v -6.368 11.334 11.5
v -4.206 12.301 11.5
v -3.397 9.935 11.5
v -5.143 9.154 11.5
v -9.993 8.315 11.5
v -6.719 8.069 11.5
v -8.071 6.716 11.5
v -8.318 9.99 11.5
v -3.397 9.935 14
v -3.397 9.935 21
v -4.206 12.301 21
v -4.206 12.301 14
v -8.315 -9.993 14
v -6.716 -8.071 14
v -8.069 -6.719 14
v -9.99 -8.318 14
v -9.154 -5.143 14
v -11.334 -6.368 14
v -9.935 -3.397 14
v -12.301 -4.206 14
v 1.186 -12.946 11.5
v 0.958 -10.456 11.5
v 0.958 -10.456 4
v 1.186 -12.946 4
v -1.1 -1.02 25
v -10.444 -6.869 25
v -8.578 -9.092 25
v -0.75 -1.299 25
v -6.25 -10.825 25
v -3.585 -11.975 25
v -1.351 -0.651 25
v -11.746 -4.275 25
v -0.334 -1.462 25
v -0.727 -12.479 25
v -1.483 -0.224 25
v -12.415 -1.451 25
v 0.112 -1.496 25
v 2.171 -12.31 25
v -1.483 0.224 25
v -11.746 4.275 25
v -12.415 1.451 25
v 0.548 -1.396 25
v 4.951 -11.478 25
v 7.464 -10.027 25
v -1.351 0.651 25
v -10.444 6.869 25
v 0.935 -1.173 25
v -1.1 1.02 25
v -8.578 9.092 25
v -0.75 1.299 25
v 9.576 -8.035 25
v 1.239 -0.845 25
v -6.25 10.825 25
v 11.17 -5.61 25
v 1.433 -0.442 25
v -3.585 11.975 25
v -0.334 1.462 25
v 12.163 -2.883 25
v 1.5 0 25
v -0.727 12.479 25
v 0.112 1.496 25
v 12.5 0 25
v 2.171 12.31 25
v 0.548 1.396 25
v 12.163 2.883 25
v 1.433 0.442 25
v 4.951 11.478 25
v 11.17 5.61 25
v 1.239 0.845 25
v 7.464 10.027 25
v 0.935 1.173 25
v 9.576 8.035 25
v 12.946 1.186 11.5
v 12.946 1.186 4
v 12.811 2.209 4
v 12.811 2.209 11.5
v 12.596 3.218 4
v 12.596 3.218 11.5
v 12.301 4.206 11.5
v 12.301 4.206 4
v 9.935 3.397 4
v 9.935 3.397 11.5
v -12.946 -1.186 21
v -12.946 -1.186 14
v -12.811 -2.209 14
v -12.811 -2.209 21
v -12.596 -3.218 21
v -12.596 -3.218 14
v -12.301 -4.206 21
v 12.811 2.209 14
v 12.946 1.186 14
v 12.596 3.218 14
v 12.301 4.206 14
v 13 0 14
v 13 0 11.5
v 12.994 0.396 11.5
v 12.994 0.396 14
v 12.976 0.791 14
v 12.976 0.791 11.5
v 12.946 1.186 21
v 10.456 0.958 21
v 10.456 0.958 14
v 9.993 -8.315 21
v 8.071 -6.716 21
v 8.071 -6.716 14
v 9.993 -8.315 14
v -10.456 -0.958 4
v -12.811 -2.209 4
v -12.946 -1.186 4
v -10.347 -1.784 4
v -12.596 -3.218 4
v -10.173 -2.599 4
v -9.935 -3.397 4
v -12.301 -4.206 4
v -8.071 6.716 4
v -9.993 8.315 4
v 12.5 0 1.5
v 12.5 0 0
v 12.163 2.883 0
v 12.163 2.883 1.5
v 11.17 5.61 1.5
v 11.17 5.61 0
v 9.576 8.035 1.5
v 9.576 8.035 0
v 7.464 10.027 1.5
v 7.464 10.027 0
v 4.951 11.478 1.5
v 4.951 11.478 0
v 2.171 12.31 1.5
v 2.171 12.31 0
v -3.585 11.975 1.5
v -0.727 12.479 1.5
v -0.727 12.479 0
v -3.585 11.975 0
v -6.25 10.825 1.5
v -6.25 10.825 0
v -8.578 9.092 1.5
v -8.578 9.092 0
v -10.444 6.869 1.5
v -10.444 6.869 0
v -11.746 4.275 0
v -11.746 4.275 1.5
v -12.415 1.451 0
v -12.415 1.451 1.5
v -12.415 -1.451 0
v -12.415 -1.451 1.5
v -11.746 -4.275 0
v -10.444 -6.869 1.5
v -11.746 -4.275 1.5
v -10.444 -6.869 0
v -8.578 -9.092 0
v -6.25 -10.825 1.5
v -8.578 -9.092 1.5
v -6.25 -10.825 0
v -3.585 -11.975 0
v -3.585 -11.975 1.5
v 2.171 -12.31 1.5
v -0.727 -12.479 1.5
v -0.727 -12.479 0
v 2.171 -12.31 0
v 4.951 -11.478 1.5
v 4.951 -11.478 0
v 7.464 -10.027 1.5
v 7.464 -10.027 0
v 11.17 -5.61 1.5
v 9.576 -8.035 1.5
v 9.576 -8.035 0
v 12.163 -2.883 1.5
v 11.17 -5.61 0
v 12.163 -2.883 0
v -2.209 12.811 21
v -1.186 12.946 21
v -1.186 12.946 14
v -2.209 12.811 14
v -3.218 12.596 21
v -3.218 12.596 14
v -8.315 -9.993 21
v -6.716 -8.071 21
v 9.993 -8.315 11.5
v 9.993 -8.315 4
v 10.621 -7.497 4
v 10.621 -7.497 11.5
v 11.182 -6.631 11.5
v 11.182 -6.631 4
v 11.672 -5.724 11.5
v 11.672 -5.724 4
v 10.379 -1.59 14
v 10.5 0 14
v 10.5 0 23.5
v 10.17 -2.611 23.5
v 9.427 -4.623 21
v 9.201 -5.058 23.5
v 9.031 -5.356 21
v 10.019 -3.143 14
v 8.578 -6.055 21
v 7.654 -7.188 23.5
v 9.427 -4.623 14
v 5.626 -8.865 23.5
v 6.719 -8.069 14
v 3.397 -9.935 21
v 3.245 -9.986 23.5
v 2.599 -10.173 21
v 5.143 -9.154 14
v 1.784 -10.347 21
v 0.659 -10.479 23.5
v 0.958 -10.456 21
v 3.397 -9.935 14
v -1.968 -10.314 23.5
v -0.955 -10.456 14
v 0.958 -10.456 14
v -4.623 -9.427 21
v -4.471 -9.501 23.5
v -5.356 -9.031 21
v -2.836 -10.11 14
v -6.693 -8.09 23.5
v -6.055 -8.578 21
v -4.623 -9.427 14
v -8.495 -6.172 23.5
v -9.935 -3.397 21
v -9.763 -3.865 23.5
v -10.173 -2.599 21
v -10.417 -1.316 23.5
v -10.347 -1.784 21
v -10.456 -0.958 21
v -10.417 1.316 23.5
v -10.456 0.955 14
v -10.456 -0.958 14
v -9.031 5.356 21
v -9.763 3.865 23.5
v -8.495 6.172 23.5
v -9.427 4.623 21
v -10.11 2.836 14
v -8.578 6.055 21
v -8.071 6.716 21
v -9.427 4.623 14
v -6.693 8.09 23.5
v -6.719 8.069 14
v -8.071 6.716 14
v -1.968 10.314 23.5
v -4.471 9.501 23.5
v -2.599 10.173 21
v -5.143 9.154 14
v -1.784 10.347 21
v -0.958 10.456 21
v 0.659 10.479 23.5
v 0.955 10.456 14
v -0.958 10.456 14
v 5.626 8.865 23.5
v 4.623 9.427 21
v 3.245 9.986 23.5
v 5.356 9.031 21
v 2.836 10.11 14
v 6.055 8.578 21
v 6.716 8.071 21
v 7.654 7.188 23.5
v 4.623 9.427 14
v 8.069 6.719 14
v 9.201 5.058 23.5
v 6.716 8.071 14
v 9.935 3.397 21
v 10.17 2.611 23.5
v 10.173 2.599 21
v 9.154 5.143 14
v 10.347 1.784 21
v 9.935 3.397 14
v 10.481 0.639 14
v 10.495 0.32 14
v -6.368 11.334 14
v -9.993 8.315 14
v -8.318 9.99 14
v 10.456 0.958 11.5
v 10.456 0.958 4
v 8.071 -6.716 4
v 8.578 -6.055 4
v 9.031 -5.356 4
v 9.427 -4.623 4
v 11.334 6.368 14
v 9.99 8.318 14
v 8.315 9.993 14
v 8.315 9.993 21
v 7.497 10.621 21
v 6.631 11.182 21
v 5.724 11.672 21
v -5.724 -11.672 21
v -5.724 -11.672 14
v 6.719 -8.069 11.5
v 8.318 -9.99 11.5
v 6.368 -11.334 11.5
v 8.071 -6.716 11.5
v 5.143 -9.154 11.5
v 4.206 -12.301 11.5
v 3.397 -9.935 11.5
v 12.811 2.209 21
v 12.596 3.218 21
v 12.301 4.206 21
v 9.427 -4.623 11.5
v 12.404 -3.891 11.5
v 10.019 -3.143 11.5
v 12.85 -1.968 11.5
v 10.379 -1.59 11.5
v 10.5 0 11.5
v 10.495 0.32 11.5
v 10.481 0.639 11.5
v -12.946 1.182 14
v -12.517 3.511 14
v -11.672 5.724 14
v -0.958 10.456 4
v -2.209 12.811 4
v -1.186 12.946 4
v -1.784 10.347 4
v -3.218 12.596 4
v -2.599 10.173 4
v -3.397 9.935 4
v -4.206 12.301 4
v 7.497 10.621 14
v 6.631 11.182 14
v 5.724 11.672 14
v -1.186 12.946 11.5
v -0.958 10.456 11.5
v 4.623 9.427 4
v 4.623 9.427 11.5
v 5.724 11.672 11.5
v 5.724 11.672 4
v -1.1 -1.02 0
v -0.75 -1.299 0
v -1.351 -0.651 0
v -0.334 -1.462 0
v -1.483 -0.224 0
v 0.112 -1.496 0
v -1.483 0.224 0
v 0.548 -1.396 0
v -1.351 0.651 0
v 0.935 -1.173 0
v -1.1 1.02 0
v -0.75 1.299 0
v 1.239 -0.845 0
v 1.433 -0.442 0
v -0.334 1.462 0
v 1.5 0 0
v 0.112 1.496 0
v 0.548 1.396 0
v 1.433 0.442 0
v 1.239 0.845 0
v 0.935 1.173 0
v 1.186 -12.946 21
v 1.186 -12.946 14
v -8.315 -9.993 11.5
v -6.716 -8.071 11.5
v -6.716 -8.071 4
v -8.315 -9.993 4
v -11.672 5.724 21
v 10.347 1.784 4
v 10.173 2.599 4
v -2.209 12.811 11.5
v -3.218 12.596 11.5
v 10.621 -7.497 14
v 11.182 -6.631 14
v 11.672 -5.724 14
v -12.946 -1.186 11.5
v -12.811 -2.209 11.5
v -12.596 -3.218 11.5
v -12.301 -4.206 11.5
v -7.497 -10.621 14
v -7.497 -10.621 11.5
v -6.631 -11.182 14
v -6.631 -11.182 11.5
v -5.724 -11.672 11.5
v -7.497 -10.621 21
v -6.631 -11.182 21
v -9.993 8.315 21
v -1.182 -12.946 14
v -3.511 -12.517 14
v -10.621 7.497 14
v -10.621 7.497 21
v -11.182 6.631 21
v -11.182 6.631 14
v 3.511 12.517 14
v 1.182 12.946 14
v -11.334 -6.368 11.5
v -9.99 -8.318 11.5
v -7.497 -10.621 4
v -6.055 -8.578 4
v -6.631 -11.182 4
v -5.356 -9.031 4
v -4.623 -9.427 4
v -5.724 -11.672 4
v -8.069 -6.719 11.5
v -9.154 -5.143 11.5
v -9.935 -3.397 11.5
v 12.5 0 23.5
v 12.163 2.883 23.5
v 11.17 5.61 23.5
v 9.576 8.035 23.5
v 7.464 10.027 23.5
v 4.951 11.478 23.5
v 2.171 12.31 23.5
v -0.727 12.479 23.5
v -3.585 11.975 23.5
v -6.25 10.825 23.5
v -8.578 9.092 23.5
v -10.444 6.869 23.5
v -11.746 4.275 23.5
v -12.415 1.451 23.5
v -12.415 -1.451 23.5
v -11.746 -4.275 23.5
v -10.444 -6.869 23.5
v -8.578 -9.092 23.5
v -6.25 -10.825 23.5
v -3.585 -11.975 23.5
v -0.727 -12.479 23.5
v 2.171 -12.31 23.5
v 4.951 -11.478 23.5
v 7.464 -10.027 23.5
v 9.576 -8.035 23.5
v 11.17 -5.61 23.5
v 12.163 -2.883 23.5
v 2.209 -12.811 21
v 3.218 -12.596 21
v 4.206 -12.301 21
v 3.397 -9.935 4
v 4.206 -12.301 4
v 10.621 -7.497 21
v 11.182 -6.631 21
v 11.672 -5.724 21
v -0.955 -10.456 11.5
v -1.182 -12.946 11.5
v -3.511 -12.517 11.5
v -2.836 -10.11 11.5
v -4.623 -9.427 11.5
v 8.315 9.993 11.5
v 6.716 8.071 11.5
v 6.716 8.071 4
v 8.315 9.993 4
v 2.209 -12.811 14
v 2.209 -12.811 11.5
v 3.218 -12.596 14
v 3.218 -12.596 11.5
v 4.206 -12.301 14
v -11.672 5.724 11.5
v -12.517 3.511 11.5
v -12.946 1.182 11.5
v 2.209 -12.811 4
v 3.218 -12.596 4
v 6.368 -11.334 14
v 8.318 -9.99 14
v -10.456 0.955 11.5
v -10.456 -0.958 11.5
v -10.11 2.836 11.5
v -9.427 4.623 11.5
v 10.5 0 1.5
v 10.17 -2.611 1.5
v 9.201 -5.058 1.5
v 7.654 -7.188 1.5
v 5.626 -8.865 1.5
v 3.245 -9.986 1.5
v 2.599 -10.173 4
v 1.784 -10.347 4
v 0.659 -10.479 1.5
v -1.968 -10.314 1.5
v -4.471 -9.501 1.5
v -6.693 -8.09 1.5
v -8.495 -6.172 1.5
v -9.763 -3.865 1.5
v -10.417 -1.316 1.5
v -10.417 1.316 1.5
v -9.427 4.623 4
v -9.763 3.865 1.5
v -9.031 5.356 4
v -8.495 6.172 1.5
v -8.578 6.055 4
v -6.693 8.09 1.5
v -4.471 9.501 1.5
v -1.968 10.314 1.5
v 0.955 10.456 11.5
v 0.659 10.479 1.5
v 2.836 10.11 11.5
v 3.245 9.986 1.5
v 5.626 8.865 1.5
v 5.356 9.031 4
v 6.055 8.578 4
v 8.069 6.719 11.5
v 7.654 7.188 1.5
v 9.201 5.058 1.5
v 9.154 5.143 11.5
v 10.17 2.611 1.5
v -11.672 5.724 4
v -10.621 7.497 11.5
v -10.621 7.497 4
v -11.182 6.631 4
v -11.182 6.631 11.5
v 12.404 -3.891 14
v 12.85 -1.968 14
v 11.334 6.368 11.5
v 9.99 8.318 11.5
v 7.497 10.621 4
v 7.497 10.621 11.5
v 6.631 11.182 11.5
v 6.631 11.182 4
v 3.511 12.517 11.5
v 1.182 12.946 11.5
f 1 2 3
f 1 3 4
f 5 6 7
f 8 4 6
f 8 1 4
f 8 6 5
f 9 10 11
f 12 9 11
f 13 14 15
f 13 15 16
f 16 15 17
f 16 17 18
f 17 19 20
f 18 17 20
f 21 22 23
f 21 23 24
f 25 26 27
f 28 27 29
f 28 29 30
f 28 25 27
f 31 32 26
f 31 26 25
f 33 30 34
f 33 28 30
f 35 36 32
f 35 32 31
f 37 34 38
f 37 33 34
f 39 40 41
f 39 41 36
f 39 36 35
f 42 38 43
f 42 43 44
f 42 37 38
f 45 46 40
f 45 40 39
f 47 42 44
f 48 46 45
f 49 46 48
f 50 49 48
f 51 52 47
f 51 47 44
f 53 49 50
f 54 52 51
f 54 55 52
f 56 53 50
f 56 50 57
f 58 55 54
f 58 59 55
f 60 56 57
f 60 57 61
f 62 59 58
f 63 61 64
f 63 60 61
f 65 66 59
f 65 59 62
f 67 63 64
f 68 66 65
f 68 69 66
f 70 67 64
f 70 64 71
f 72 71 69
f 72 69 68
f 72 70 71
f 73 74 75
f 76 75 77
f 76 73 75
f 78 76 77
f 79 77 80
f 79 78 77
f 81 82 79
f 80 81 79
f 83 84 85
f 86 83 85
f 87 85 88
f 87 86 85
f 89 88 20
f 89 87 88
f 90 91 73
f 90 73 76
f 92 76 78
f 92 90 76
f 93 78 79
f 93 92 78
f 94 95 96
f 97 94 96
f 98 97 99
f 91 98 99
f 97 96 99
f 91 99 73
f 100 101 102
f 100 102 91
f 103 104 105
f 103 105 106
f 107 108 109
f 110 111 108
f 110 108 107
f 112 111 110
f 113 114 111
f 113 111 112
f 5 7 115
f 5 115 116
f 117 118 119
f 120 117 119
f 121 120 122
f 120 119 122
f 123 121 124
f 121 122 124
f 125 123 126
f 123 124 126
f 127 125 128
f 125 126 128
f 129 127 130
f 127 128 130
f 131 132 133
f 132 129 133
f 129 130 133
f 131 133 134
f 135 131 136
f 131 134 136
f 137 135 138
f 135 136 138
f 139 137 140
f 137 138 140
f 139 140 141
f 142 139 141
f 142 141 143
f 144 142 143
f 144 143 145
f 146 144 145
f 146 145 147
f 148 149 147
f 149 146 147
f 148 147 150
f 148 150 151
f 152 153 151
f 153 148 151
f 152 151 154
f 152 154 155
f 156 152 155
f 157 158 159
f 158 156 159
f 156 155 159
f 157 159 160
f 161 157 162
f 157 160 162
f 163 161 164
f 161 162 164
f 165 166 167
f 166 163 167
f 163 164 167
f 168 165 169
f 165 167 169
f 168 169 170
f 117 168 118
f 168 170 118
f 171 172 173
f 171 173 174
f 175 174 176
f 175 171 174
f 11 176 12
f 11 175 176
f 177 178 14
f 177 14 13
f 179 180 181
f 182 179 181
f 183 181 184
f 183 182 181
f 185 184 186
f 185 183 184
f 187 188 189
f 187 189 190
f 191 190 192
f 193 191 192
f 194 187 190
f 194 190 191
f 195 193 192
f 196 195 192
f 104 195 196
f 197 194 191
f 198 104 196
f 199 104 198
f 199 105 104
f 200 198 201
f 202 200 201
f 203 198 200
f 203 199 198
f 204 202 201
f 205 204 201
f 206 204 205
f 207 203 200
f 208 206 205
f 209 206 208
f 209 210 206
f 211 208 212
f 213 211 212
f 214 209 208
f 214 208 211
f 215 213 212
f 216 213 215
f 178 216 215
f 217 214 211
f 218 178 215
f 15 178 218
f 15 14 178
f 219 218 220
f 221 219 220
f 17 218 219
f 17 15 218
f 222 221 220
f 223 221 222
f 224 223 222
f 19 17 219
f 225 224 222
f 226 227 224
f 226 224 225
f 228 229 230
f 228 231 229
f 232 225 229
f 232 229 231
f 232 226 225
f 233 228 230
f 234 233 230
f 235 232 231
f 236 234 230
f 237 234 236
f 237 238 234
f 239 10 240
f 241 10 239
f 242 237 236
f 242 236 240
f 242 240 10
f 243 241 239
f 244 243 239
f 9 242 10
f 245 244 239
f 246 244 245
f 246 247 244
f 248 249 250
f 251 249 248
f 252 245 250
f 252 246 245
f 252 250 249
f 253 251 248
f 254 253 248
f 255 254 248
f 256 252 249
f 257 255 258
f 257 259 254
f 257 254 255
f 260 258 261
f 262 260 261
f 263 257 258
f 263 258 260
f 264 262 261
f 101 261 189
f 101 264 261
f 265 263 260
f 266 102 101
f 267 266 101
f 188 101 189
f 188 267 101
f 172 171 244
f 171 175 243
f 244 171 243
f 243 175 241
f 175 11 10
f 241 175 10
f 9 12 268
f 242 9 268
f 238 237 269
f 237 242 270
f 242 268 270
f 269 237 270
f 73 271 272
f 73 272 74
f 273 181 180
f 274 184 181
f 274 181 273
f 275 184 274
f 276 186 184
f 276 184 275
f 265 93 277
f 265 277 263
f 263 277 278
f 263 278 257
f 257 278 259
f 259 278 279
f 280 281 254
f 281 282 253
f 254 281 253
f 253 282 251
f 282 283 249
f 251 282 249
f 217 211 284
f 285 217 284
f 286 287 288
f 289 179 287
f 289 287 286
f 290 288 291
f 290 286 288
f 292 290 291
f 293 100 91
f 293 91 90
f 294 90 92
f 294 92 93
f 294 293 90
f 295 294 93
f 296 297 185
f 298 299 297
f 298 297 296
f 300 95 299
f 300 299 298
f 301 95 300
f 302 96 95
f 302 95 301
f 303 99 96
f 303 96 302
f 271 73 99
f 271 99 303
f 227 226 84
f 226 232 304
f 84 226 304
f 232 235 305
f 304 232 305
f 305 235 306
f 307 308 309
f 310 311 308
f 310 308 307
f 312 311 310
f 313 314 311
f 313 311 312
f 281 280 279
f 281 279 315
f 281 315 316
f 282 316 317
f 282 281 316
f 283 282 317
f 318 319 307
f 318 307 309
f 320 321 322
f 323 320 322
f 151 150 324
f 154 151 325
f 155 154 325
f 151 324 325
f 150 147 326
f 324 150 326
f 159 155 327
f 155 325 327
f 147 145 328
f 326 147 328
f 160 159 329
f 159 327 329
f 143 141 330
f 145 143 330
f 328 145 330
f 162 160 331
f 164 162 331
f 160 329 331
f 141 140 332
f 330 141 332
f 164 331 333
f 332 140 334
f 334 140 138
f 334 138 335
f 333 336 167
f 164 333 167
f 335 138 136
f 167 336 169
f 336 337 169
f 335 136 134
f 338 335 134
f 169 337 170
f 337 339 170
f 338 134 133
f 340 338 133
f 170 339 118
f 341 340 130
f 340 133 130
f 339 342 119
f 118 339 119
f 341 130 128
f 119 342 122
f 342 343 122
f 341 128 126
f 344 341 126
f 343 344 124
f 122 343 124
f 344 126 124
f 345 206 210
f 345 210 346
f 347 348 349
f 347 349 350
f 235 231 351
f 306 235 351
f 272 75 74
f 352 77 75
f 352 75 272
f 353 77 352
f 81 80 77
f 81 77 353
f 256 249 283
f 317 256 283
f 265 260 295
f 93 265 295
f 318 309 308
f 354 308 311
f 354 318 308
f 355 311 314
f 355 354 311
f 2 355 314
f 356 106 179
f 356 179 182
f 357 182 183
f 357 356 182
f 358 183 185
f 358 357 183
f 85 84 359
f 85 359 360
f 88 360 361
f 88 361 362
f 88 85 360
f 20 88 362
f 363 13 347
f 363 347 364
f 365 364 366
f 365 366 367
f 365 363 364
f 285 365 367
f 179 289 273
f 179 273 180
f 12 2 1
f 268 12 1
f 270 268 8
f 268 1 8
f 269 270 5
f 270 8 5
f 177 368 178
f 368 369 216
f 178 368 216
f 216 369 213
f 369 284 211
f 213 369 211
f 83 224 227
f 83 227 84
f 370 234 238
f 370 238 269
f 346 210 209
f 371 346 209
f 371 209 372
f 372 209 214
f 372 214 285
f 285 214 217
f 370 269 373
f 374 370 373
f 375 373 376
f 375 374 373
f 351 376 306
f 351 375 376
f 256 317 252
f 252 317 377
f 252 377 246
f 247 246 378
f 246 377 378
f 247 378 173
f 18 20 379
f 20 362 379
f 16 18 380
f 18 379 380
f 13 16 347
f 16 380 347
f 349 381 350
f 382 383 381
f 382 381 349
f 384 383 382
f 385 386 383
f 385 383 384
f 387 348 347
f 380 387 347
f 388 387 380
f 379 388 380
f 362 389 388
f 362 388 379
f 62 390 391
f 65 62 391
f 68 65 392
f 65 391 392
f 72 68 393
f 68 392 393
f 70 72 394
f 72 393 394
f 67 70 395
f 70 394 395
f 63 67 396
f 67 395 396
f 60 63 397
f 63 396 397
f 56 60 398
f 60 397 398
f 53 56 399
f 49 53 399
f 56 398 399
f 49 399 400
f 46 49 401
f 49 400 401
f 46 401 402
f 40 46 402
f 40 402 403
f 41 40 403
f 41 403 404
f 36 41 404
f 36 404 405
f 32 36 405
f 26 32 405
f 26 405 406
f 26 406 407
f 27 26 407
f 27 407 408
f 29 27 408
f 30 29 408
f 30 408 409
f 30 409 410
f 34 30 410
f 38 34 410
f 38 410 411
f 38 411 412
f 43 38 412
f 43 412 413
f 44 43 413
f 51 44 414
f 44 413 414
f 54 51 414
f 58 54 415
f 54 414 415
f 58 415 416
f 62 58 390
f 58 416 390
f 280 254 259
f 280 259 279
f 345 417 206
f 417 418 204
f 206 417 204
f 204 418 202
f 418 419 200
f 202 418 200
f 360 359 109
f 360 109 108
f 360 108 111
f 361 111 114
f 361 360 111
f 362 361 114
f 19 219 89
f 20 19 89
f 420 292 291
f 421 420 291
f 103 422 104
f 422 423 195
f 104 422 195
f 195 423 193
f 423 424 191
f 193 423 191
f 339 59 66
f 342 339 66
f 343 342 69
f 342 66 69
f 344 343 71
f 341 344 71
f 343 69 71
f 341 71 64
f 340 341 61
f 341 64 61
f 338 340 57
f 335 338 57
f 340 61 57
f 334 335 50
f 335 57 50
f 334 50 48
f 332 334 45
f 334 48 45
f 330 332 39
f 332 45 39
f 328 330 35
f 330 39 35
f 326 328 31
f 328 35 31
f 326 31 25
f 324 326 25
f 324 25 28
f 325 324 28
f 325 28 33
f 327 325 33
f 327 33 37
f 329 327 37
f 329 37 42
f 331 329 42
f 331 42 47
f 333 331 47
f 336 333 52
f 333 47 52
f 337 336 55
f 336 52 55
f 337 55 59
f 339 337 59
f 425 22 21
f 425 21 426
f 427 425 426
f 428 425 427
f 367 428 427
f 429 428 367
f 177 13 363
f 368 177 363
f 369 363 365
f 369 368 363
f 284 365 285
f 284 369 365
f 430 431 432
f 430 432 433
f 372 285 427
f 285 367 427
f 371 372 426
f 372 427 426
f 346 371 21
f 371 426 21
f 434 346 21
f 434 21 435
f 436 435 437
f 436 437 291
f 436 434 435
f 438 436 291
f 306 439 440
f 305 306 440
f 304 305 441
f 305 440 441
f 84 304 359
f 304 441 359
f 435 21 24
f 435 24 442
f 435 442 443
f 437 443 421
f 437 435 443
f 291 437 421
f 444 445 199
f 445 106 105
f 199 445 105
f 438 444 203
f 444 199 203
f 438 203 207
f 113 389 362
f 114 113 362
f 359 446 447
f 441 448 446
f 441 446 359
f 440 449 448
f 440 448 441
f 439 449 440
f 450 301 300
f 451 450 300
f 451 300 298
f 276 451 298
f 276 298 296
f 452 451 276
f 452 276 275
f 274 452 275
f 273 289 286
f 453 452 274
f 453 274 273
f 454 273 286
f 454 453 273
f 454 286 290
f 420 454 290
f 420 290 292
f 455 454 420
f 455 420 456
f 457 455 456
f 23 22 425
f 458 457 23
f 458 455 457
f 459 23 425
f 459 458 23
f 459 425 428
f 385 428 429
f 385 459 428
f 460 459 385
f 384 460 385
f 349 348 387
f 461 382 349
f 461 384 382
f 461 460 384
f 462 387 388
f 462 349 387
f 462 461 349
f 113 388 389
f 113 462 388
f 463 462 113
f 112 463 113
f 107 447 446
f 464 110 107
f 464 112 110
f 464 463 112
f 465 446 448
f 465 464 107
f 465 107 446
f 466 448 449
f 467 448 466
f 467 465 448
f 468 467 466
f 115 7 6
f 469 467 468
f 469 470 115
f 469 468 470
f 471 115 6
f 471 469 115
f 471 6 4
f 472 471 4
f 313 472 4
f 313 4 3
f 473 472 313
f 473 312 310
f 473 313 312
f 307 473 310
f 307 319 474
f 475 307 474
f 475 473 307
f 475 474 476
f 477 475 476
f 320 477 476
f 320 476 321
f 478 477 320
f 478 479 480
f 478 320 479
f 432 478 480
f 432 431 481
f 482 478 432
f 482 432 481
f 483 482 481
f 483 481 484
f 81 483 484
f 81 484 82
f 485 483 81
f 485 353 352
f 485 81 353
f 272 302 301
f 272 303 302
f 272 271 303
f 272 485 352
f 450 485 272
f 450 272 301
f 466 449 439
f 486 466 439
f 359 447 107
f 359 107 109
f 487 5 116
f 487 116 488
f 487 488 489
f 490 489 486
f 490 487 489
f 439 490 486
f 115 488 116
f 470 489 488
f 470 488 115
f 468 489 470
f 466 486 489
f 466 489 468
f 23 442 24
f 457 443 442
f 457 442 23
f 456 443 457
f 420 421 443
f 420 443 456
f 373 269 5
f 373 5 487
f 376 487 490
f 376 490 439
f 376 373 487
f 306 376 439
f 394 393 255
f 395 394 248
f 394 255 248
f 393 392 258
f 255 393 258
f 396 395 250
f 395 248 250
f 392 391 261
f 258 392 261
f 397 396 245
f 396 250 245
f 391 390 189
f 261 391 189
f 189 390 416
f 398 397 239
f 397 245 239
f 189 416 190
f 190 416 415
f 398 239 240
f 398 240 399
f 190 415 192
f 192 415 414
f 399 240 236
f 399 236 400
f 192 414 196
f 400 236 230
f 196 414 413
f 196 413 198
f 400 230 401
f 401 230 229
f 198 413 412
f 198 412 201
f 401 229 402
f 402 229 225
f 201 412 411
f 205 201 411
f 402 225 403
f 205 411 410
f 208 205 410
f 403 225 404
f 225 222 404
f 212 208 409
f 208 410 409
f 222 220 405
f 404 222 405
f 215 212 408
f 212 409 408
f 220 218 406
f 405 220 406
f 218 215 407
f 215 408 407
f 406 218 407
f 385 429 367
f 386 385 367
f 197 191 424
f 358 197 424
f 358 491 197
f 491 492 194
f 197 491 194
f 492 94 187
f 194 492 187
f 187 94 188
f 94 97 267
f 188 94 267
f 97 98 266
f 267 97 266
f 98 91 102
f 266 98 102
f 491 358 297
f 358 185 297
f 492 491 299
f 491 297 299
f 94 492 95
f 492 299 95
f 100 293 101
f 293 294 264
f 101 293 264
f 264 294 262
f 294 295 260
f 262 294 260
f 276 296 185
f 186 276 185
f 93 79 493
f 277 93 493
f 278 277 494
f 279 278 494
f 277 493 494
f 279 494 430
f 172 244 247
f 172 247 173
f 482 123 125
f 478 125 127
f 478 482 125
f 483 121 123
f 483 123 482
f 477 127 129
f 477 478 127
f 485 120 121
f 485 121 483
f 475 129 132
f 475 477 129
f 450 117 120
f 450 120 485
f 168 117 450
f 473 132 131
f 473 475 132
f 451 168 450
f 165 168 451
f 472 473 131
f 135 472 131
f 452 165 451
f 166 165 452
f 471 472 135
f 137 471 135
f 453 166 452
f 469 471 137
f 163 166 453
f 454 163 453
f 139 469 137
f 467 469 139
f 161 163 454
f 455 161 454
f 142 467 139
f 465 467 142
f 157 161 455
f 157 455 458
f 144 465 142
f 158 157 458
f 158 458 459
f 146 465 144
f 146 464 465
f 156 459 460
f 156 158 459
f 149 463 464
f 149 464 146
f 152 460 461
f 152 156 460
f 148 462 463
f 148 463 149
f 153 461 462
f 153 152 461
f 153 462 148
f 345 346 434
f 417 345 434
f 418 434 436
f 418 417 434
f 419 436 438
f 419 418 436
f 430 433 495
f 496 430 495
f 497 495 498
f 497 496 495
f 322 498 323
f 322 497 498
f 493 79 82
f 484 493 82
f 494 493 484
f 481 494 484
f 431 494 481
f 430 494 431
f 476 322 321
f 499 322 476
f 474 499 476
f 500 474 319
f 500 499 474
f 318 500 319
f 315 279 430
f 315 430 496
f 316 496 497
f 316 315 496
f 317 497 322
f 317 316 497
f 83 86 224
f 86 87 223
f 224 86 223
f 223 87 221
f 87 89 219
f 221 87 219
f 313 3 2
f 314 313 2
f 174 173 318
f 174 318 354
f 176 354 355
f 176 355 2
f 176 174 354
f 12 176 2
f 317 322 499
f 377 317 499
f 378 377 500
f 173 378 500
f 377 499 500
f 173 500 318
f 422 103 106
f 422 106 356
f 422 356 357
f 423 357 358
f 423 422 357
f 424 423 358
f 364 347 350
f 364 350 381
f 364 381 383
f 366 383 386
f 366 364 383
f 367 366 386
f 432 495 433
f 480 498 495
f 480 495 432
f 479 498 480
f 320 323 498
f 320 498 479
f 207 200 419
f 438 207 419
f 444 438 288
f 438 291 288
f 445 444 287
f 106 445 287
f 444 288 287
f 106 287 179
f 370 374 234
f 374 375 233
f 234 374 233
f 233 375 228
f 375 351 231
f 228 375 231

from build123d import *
from build123d.topology import SkipClean

# Parameters (mm, degrees)
CROQUIS1_R              = 12.5
SALIENTE_EXTRUIR1_DEPTH = 25
CROQUIS2_W              = 22
CROQUIS2_H              = 2
CROQUIS3_R              = 1.5
CORTAR_EXTRUIR1_DEPTH   = 25
ENVOLVER1_SECTION_W     = 2.5
ENVOLVER1_SECTION_H     = 17
ENVOLVER1_ANGLE         = 13.641852265
MATRIZC1_COUNT          = 8
CROQUIS5_W              = 2.5
CROQUIS5_H              = 2.5


with BuildPart() as part:
    # Croquis1 → Saliente-Extruir1 (new body)
    with BuildSketch(Plane.XY):
        Circle(CROQUIS1_R)
    extrude(amount=SALIENTE_EXTRUIR1_DEPTH)

    # Croquis2 → Cortar-Revolución1 (revolve, cut)
    with BuildSketch(Plane(origin=(0, 0, 0), x_dir=(0, 0, -1), z_dir=(1, 0, 0)), mode=Mode.PRIVATE) as cortar_revoluci_n1_sk:
        with Locations((-12.5, 11.5)):
            Rectangle(CROQUIS2_W, CROQUIS2_H)
    revolve(cortar_revoluci_n1_sk.sketch.rotate(Axis((0, 0, 31.879564167), (0, 0, -1)), 90), axis=Axis((0, 0, 31.879564167), (0, 0, -1)), mode=Mode.SUBTRACT)

    # Croquis3 → Cortar-Extruir1 (cut)
    with BuildSketch(Plane.XY.offset(25)):
        Circle(CROQUIS3_R)
    extrude(amount=-CORTAR_EXTRUIR1_DEPTH, mode=Mode.SUBTRACT)

    # Envolver1 section (on wrap section) → Envolver1 (revolve)
    with BuildSketch(Plane(origin=(0, 0, 1.5), x_dir=(0.9958286703068172, 0.09124285941900567, 0), z_dir=(0.09124285941900567, -0.9958286703068172, 0))):
        with Locations((11.75, 11)):
            Rectangle(ENVOLVER1_SECTION_W, ENVOLVER1_SECTION_H)
    envolver1 = revolve(axis=Axis((0, 0, 1.5), (0, 0, 1)), revolution_arc=ENVOLVER1_ANGLE)

    # MatrizC1: Envolver1 ×8 about axis
    matrizc1_axis = Axis((0, 0, 0), (0, 0, 1))
    for i in range(1, MATRIZC1_COUNT):
        add(envolver1.rotate(matrizc1_axis, i * 360 / MATRIZC1_COUNT))

    # Croquis5 → Revolución1 (revolve)
    with SkipClean():  # the faces are left unmerged after this step: merging them gives an invalid solid
        with BuildSketch(Plane(origin=(0, 0, 0), x_dir=(1, 0, 0), z_dir=(0, 1, 0))):
            with Locations((11.75, -12.75)):
                Rectangle(CROQUIS5_W, CROQUIS5_H)
        revolve(axis=Axis((0, 0, -6.443168791), (0, 0, 1)))


solid = part.part
